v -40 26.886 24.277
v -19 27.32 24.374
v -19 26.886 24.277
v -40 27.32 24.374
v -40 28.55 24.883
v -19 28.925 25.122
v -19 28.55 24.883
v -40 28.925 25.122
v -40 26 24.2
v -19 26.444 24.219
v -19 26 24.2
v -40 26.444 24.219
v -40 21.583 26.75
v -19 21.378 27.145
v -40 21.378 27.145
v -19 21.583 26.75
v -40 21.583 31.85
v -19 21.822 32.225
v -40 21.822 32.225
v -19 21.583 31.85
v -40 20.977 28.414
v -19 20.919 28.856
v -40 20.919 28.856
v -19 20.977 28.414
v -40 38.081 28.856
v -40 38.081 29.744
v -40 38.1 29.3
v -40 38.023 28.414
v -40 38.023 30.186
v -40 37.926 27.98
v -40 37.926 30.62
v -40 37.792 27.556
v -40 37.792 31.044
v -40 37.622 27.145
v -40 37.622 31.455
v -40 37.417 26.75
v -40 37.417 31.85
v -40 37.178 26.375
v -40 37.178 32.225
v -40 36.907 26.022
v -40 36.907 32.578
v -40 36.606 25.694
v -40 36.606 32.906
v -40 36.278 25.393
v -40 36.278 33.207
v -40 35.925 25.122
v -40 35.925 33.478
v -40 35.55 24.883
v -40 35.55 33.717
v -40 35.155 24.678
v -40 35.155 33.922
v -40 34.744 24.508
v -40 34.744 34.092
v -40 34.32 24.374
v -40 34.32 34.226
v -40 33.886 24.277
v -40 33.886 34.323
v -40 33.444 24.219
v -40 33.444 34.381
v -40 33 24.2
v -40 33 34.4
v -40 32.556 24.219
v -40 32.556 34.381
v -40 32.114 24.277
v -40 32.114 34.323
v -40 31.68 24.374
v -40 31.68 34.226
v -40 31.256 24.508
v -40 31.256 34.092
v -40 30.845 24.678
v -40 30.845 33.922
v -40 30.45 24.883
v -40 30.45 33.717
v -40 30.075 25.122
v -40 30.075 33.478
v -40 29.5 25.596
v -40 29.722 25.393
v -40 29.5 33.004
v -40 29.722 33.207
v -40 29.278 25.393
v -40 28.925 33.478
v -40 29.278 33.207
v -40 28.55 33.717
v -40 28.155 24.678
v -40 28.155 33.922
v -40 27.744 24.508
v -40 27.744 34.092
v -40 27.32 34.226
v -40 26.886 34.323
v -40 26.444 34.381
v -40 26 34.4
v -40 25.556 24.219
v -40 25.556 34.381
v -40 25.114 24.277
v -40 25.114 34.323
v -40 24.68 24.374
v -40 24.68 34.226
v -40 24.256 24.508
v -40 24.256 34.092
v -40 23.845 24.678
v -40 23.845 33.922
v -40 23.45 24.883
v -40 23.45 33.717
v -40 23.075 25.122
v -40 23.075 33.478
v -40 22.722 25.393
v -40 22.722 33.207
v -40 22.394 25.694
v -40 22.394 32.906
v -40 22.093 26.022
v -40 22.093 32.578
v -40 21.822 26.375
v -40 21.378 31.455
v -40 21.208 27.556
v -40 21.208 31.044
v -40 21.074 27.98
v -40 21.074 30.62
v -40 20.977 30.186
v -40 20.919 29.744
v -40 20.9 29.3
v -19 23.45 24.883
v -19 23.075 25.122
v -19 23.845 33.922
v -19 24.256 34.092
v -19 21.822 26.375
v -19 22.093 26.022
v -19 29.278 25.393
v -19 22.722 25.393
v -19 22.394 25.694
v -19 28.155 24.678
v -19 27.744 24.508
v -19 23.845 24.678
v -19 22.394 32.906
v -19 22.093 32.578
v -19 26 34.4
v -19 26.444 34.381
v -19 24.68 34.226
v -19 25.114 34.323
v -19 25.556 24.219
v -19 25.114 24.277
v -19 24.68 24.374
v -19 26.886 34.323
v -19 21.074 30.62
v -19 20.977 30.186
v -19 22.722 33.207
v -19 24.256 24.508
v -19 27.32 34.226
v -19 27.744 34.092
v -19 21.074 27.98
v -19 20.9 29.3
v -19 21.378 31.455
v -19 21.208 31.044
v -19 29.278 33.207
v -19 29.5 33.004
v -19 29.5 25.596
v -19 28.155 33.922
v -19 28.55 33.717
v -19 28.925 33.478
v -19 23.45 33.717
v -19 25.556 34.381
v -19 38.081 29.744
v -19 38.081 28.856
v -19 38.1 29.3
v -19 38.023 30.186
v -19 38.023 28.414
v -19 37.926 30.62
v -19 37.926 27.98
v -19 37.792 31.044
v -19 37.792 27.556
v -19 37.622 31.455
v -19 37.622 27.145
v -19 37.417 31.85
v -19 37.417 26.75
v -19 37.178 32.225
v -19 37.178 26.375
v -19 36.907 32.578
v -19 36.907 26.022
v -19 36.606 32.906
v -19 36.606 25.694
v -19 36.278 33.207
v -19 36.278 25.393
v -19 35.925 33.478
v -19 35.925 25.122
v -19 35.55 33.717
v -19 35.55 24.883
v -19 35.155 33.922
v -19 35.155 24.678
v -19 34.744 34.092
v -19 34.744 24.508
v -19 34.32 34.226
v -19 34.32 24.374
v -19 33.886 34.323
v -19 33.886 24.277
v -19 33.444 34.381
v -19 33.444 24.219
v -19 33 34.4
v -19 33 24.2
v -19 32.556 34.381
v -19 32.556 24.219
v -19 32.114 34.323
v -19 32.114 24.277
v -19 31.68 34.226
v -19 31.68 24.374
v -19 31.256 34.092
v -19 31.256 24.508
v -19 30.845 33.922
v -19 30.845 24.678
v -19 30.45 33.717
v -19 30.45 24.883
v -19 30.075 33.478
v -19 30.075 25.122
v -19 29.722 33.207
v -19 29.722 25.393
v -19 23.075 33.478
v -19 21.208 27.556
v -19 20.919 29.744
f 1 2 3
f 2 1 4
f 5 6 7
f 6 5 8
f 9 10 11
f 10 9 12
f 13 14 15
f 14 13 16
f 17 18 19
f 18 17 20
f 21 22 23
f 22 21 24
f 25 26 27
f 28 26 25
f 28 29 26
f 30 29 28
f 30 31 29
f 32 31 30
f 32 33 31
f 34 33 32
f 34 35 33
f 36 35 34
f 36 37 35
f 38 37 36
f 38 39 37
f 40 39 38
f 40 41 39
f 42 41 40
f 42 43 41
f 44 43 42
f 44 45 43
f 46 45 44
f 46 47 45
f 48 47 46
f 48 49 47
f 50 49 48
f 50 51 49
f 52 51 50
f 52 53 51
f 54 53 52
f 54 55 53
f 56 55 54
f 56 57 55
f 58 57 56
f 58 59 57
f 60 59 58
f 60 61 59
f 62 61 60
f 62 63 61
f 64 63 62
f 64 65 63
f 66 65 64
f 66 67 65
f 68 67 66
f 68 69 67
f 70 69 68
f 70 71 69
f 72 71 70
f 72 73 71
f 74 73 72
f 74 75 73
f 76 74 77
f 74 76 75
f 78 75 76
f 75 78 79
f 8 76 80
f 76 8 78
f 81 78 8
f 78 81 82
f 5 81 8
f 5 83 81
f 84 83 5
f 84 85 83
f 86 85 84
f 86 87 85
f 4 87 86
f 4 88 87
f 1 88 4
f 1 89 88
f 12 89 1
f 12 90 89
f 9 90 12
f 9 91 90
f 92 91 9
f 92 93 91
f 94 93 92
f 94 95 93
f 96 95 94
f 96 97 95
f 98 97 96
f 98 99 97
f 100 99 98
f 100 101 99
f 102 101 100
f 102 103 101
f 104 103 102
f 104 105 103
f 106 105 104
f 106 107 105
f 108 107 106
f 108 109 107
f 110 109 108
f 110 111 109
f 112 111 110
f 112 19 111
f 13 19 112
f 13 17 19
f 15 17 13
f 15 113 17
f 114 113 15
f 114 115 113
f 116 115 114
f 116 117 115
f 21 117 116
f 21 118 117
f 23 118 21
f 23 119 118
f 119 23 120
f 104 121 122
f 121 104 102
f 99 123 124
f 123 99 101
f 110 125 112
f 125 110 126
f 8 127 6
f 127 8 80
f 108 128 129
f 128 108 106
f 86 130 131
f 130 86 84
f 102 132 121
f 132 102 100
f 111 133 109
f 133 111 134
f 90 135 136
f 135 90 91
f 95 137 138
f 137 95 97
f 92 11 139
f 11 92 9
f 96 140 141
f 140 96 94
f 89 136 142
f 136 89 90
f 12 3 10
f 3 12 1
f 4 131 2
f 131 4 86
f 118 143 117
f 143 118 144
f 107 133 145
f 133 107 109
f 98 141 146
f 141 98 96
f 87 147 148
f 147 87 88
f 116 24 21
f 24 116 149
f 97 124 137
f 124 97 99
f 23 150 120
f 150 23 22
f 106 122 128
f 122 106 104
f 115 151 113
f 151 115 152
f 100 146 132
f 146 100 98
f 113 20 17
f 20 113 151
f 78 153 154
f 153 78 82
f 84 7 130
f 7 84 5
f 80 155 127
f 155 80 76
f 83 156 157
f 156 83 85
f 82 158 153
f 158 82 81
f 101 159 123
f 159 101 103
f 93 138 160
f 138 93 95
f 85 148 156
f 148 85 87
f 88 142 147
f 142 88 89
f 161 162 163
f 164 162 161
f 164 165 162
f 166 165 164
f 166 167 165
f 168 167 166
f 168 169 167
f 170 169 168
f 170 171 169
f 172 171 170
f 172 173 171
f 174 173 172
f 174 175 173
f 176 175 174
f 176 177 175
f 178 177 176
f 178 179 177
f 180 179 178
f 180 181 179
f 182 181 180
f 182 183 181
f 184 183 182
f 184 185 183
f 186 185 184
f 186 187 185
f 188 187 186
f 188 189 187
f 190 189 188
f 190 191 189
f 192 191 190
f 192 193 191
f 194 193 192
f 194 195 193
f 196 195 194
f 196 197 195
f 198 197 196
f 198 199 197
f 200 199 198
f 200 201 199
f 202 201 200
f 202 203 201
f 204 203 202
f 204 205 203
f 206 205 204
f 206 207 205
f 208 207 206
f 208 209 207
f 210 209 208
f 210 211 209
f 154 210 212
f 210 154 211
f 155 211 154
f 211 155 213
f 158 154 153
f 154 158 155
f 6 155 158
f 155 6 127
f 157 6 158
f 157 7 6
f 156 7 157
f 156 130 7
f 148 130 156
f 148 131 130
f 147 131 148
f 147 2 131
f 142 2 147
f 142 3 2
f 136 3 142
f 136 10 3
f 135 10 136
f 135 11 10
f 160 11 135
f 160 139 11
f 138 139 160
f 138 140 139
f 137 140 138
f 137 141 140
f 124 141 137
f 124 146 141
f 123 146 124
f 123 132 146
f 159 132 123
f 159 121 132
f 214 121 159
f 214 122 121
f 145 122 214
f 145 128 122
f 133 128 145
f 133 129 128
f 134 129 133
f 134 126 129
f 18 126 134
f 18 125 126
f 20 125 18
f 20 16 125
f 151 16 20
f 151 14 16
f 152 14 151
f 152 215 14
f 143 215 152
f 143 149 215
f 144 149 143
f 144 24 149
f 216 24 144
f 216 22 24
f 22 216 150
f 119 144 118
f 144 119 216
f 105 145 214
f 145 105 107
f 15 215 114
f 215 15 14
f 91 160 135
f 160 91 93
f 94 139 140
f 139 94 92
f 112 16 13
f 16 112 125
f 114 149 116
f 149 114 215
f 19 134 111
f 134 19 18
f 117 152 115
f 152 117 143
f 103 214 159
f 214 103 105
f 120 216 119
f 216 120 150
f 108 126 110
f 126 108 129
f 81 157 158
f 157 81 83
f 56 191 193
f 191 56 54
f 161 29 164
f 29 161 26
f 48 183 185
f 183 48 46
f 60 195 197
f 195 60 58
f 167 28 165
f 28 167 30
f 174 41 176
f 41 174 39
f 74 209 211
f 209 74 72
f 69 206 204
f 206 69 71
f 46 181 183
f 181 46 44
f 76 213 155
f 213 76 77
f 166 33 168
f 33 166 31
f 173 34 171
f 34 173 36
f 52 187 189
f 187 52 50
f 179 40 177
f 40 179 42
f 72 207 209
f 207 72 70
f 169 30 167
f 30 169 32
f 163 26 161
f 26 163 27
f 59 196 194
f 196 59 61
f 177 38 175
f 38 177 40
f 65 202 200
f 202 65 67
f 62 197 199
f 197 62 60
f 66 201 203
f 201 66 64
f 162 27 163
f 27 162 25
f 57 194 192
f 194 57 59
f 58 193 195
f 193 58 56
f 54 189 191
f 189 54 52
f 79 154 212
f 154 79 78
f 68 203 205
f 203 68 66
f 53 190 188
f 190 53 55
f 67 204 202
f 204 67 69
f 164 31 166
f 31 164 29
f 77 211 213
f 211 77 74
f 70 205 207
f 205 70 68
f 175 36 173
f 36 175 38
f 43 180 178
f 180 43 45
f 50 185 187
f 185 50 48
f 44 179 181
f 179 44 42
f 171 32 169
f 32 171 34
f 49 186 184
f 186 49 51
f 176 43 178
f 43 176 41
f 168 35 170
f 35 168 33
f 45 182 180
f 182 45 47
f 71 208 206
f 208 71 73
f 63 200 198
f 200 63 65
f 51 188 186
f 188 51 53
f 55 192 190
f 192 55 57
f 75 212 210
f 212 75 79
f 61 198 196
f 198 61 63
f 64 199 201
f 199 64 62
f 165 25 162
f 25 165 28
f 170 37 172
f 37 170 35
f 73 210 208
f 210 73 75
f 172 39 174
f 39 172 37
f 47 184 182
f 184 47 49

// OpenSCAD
// file: ../md_vitamins.scad
// Envelopes of the bought electronics, placed where the parts expect them (for fit checks and renders)
SG90_STL = "/Users/hemangvora/OpenDuck/upstream/Open_Duck_Mini/mini_bdx/robots/open_duck_mini_v2/sg90.stl";
module v_sg90_jaw() multmatrix([[1,0,0,JAW_P[0]-5.7],[0,0,-1,-SG_BASE],[0,1,0,JAW_P[1]],[0,0,0,1]]) import(SG90_STL);
module v_radxa() {                         // Radxa Zero 3W 65 x 30 board on 6 mm standoffs + 16 mm component/wire budget
    translate([RADXA_X0, RADXA_Y0, CH_Z1 + 6]) { cube([65, 30, 1.6]); translate([2, 2, 1.6]) cube([61, 26, 16]); translate([0, 0, -2]) cube([65, 30, 2]); }
}
module v_buck() translate([-30, -13.5, CH_Z1 + 1]) cube([46, 27, 12]);            // XY-3606 (HW-688), generous envelope
module v_camera() translate([103.8, -12.5, EYE_C[1] - 14.5]) { cube([1.0, 25, 24]); translate([1.0, 12.5 - 4.25, 14.5 - 4.25]) cube([5.2, 8.5, 8.5]); }  // Pi cam v2 / IMX219 board + lens module
module v_tof() translate([103.8, -6.5, TOF_C[1] - 6.5]) { cube([1.0, 13, 13]); translate([1.0, 6.5 - 3.2, 6.5 - 1.5]) cube([1.75, 6.4, 3.0]); }
module head_vitamins() { v_sg90_jaw(); v_radxa(); v_buck(); v_camera(); v_tof(); }

// ---------------- body electronics ----------------
module v_pack()    translate([DK_X0, -PACK[1] / 2, DK_Z1]) cube(PACK);                       // 3S1P Samsung 30Q pack
module v_bms()     translate([DK_X0 + 5, -31, DK_Z1 + PACK[2] + 0.5]) cube([48, 62, 7]);      // 3S 40 A BMS, 5-FET board
module v_adapter() translate([-44, -21, SHELF[4] + 4]) { cube([33, 42, 1.6]); translate([1, 1, 1.6]) cube([31, 40, 10]); }   // Bus Servo Adapter (A)
module v_switch()  {   // AUTO MT 12 V 20 A toggle, 12 mm hole; body 28 x 16 behind the panel, cover outside
    translate([DK_X0, SWITCH_C[0] - 14, SWITCH_C[1] - 8]) cube([45, 28, 16]);
    translate([BX_R - 25, SWITCH_C[0] - 14, SWITCH_C[1] - 8]) cube([25, 28, 16]);
}
module v_xt30()    translate([DK_X0, XT30_C[0] - 5.1, XT30_C[1] - 2.6]) cube([16, 10.2, 5.2]);
module v_balance() translate([DK_X0, BAL_C[0] - 6.2, BAL_C[1] - 2.9]) cube([8, 12.4, 5.8]);
module v_caps()    for (y = [26, 33]) translate([-40, y, SHELF[4] + 5.3]) rotate([0, 90, 0]) cylinder(d = 10.2, h = 21);  // 2 x 1000 uF 25 V lying on the shelf
module body_vitamins() { v_pack(); v_bms(); v_adapter(); v_switch(); v_xt30(); v_balance(); v_caps(); }
// file: ../md_params.scad
// =====================================================================
//  Microduck-look skin for the Open Duck Mini v2 skeleton
//  Shared parameters and helpers.
//  Frame: Open Duck print/robot frame, mm. +x forward, +y left, +z up.
//  Every part is modelled where it sits on the robot (zero pose).
// =====================================================================

$fn = 72;
EPS = 0.01;

// ---------- fasteners ----------
INSERT_D   = 4.0;   // hole for M3 x 5 brass heat-set insert (Amazon B0DZ8B7FW1)
INSERT_L   = 6.0;   // hole depth for that insert
M3_CLR     = 3.4;   // M3 clearance
M3_HEAD    = 6.5;   // M3 socket-head counterbore
M3_NUT     = 6.4;   // M3 nut across corners (+clearance)
M2_TAP     = 1.8;   // M2 self-tapping pilot (SG90 tab screws, servo adapter)
M25_TAP    = 2.2;   // M2.5 self-tapping pilot (Radxa)
M2_CLR     = 2.4;

// ---------- colours (for previews only) ----------
C_WHITE = [0.95, 0.94, 0.90];
C_BLACK = [0.13, 0.13, 0.14];

// ---------- helpers ----------
function lerp(a, b, t) = a + (b - a) * t;

// Section with vertical sides from zb to zc and a superellipse cap from zc to zt.
// Points are (y, z). n = 2 gives an ellipse, larger n gives a squarer top.
function se_pts(w, zb, zc, zt, n, N = 56) =
    concat(
        [[ w, zb]],
        [for (i = [0:N]) let(t = i * 180 / N, c = cos(t), s = sin(t))
            [w * sign(c) * pow(abs(c), 2 / n), zc + (zt - zc) * pow(abs(s), 2 / n)]],
        [[-w, zb]]
    );

// st = [x, half_width, z_bottom, z_curve_start, z_top, exponent]
module station(st, inset = 0, ext = 0) {
    translate([st[0], 0, 0]) rotate([90, 0, 90])
        linear_extrude(height = EPS, center = true)
            offset(delta = -inset)
                polygon(se_pts(st[1], st[2] - ext, st[3], st[4], st[5]));
}

// piecewise loft through convex stations (hull of neighbours)
module loft(sts, inset = 0, ext = 0) {
    for (i = [0:len(sts) - 2])
        hull() { station(sts[i], inset, ext); station(sts[i + 1], inset, ext); }
}

// station parameters interpolated at any x inside the list
function st_at(sts, x) =
    let(i = max([for (k = [0:len(sts) - 2]) if (sts[k][0] <= x) k]),
        a = sts[i], b = sts[i + 1], t = (x - a[0]) / (b[0] - a[0]))
    [x, lerp(a[1], b[1], t), lerp(a[2], b[2], t), lerp(a[3], b[3], t),
        lerp(a[4], b[4], t), lerp(a[5], b[5], t)];

// heat-set insert pocket: opening at origin, going along -z by default
module insert_hole(depth = INSERT_L, d = INSERT_D) {
    translate([0, 0, -depth]) cylinder(d = d, h = depth + EPS);
    translate([0, 0, -0.6]) cylinder(d1 = d, d2 = d + 0.8, h = 0.6 + EPS);   // lead-in chamfer
}

// M3 clearance with counterbore, axis +z, counterbore at the top
module m3_cb(len_total, cb_depth) {
    translate([0, 0, -EPS]) cylinder(d = M3_CLR, h = len_total + 2 * EPS);
    translate([0, 0, len_total - cb_depth]) cylinder(d = M3_HEAD, h = cb_depth + 1);
}

module rrect(x0, x1, y0, y1, r) {
    translate([x0 + r, y0 + r]) offset(r = r) square([x1 - x0 - 2 * r, y1 - y0 - 2 * r]);
}
// main file
include <../md_params.scad>
include <../md_head.scad>
include <../md_body.scad>
include <../md_vitamins.scad>
v_caps();
